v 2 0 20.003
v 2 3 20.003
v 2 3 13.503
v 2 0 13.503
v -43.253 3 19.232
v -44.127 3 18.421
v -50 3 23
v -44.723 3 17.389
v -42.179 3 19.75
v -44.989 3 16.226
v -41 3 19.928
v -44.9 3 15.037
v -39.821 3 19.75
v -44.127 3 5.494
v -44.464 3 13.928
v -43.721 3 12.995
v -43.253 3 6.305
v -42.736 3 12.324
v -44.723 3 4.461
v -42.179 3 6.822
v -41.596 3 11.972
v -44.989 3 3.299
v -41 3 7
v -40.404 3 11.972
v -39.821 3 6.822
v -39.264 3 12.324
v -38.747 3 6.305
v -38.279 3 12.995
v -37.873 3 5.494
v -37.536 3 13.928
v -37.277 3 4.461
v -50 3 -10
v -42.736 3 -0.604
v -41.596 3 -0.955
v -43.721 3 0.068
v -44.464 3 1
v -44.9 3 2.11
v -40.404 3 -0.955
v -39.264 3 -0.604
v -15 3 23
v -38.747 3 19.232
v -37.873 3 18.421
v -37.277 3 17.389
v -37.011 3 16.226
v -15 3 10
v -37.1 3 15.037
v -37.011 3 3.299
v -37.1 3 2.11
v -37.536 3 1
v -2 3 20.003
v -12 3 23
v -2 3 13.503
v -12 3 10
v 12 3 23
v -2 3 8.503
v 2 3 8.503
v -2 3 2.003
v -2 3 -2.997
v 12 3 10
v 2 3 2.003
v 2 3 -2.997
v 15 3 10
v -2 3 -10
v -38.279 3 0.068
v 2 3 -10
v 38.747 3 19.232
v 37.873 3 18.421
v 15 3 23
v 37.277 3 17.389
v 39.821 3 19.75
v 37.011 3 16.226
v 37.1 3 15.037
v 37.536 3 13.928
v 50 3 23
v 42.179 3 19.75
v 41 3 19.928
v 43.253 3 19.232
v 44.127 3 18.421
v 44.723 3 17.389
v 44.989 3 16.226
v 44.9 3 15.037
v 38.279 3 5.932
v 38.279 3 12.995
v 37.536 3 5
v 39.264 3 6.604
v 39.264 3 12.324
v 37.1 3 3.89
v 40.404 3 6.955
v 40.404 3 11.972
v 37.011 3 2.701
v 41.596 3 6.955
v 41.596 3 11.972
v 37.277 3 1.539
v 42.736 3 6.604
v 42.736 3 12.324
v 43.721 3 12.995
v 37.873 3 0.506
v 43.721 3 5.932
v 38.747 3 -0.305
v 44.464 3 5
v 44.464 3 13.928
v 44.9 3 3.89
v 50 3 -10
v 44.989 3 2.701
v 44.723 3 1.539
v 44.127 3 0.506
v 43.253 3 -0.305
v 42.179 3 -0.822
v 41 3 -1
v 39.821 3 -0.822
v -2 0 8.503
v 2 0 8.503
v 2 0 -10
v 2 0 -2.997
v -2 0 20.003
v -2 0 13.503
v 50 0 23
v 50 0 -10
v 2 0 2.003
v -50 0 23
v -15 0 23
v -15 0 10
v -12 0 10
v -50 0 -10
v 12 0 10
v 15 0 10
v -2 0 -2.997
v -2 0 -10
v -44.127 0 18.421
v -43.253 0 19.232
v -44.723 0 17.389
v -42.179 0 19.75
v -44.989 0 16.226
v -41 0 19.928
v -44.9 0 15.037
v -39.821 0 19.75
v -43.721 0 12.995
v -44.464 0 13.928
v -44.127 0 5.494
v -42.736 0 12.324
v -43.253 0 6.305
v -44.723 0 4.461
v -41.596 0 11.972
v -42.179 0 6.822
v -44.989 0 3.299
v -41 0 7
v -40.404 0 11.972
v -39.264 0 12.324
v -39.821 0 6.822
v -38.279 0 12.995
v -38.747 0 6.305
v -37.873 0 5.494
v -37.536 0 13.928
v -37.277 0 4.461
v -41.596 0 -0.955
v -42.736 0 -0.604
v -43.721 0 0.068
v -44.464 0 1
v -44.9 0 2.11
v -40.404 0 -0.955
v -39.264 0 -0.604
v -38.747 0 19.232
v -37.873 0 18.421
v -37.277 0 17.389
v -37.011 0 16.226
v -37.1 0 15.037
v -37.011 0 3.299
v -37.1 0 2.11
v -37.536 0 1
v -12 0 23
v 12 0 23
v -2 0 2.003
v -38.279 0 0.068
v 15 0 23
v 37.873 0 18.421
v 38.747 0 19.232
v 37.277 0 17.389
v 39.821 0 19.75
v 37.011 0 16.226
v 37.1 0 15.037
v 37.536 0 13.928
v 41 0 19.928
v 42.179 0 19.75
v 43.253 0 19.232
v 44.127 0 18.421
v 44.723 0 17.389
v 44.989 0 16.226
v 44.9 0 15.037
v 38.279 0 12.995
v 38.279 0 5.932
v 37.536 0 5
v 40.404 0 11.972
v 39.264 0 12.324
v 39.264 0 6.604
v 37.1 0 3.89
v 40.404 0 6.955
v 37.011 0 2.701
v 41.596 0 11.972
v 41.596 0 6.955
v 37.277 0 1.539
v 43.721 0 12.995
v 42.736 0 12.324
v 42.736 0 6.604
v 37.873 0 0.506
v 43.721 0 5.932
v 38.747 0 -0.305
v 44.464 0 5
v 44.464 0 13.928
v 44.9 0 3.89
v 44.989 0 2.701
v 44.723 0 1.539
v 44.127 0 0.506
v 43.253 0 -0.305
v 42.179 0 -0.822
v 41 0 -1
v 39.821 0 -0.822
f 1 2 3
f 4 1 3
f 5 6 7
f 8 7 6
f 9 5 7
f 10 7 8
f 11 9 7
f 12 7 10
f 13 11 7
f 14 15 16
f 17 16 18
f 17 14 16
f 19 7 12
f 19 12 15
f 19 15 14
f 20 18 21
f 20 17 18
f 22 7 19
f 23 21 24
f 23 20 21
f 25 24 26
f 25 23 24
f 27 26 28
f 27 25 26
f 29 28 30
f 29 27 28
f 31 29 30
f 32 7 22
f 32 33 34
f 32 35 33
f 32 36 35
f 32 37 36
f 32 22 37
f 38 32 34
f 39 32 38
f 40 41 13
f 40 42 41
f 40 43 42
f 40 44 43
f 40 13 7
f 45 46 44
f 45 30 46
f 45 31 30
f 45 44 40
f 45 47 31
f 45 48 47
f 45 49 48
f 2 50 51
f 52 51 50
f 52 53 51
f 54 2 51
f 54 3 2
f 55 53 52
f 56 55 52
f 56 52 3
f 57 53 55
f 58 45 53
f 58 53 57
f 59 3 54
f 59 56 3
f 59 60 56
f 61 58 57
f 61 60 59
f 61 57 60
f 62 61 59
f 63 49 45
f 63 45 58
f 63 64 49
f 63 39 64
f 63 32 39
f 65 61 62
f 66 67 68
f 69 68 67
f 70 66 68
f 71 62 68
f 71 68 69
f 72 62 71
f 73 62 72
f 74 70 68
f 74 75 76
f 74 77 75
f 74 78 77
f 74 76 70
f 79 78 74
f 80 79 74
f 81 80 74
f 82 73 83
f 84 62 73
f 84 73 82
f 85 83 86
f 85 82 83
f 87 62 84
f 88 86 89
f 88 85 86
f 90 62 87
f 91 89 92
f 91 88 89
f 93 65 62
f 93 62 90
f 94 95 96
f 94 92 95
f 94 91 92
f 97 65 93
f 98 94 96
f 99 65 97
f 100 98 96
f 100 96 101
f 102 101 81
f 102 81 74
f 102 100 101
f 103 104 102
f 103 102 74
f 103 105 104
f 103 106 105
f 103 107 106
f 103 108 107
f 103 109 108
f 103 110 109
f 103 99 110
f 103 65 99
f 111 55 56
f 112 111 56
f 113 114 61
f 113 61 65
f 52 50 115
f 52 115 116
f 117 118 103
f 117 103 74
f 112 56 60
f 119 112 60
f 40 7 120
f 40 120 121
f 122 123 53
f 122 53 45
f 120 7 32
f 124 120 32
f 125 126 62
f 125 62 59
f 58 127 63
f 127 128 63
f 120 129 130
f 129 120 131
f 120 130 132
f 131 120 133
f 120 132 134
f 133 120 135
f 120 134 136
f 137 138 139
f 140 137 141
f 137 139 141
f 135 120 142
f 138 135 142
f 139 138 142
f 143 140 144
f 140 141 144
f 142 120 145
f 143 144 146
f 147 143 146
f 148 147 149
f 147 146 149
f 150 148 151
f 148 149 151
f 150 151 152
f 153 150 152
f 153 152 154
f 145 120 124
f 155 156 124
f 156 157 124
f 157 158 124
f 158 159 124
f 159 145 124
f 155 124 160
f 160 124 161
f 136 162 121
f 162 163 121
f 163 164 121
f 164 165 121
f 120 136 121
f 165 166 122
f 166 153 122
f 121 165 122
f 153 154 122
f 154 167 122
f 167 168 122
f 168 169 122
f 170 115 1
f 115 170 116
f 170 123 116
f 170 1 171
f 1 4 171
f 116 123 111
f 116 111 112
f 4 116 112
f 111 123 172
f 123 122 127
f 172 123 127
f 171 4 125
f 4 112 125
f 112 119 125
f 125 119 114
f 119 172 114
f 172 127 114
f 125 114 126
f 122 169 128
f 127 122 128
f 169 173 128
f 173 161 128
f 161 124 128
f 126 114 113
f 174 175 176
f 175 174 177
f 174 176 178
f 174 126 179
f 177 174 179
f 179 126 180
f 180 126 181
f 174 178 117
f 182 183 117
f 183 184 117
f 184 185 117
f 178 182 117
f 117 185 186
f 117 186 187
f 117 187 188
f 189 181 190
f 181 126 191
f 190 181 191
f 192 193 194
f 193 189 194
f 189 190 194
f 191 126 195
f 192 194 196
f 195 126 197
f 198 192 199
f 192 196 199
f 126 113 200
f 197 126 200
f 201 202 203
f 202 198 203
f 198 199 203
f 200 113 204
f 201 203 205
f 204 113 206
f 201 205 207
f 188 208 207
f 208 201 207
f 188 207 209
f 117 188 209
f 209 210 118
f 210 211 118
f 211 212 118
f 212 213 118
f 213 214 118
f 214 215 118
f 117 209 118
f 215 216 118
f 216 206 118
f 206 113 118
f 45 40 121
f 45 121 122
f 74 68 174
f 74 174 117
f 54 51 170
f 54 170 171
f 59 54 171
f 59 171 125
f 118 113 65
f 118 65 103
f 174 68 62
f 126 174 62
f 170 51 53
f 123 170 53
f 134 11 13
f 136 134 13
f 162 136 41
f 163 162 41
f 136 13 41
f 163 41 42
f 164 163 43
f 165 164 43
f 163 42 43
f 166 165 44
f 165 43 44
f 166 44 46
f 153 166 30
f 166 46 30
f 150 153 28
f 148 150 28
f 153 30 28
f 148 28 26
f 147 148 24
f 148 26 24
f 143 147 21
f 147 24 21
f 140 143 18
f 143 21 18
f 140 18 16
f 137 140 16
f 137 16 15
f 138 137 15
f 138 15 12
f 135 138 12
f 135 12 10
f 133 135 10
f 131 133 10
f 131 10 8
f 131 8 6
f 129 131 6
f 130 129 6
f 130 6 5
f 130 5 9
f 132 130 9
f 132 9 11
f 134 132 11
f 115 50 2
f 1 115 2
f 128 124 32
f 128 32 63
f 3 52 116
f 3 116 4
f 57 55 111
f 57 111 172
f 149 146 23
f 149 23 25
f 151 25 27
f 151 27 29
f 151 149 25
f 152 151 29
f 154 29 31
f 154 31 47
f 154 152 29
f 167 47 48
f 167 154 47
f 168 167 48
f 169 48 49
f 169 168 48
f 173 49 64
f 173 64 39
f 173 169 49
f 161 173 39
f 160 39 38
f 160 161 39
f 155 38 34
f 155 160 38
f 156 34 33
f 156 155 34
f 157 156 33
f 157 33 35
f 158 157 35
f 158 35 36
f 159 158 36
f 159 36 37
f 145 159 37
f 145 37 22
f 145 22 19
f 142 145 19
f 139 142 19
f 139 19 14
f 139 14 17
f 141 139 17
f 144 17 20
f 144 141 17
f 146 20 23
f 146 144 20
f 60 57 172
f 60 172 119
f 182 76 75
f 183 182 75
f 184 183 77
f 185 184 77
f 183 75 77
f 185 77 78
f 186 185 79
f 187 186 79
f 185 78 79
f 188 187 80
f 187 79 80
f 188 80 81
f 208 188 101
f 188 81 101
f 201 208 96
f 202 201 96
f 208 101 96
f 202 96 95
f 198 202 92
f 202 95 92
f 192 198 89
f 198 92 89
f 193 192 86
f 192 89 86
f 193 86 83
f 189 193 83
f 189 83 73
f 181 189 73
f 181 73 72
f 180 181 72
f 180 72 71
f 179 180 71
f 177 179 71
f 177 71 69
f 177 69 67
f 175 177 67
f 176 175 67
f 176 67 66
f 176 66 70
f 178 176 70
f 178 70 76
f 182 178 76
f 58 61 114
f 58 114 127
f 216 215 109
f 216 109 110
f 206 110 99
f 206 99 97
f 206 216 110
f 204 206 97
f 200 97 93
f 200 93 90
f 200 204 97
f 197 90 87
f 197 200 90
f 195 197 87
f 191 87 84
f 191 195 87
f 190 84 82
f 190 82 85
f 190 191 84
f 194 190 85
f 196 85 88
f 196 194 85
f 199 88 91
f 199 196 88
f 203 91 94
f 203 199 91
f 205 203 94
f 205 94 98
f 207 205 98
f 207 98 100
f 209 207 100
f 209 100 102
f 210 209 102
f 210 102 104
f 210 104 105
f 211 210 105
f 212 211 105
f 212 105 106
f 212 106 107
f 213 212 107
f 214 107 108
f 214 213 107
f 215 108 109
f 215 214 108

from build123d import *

# Parameters (mm, degrees)
SKETCH_1_R          = 4
EXTRUDE_1_DEPTH     = 3
SKETCH_2_W          = 4
SKETCH_2_H          = 3
CUT_EXTRUDE_1_DEPTH = 3.33
SKETCH_3_W          = 24
SKETCH_3_H          = 13
EXTRUDE_2_DEPTH     = 3
SKETCH_4_W          = 35
SKETCH_4_H          = 13
EXTRUDE_3_DEPTH     = 3
SKETCH_5_R          = 4
CUT_EXTRUDE_2_DEPTH = 25
SKETCH_6_W          = 4
SKETCH_6_H          = 6.5
CUT_EXTRUDE_3_DEPTH = 25


with BuildPart() as part:
    # Эскиз1 → Бобышка-Вытянуть1 (new body)
    with BuildSketch(Plane(origin=(0, 0, 0), x_dir=(1, 0, 0), z_dir=(0, 1, 0))):
        Polygon((2, 10), (50, 10), (50, -10), (-50, -10), (-50, 10), (-2, 10), (-2, 6.32739691), (2, 6.32739691), align=None)
        with Locations(Location((-41, -3, 0), (0, 0, 270))):
            Circle(SKETCH_1_R, mode=Mode.SUBTRACT)
        with Locations(Location((41, -3, 0), (0, 0, 90))):
            Circle(SKETCH_1_R, mode=Mode.SUBTRACT)
    extrude(amount=EXTRUDE_1_DEPTH)

    # Эскиз2 → Вырез-Вытянуть1 (cut)
    with BuildSketch(Plane(origin=(0, 0, -6.32739691), x_dir=(-1, 0, 0), z_dir=(0, 0, -1))):
        with Locations((0, 1.5)):
            Rectangle(SKETCH_2_W, SKETCH_2_H)
    extrude(amount=-CUT_EXTRUDE_1_DEPTH, mode=Mode.SUBTRACT)

    # Эскиз3 → Бобышка-Вытянуть2 (add)
    with BuildSketch(Plane(origin=(0, 3, 0), x_dir=(1, 0, 0), z_dir=(0, 1, 0))):
        with Locations((0, -16.5)):
            Rectangle(SKETCH_3_W, SKETCH_3_H)
    extrude(amount=-EXTRUDE_2_DEPTH)

    # Эскиз4 → Бобышка-Вытянуть3 (add)
    with BuildSketch(Plane(origin=(0, 3, 0), x_dir=(1, 0, 0), z_dir=(0, 1, 0))):
        with Locations((-32.5, -16.5)):
            Rectangle(SKETCH_4_W, SKETCH_4_H)
        with Locations((32.5, -16.5)):
            Rectangle(SKETCH_4_W, SKETCH_4_H)
    extrude(amount=-EXTRUDE_3_DEPTH)

    # Эскиз5 → Вырез-Вытянуть2 (cut)
    with BuildSketch(Plane(origin=(0, 3, 0), x_dir=(1, 0, 0), z_dir=(0, 1, 0))):
        with Locations(Location((-41, -15.92753052, 0), (0, 0, 270))):
            Circle(SKETCH_5_R)
        with Locations(Location((41, -15.92753052, 0), (0, 0, 270))):
            Circle(SKETCH_5_R)
    extrude(amount=-CUT_EXTRUDE_2_DEPTH, mode=Mode.SUBTRACT)

    # Эскиз6 → Вырез-Вытянуть3 (cut)
    with BuildSketch(Plane(origin=(0, 3, 0), x_dir=(1, 0, 0), z_dir=(0, 1, 0))):
        with Locations((0, -5.25260309)):
            Rectangle(SKETCH_6_W, SKETCH_6_H)
        with Locations((0, -16.75260309)):
            Rectangle(SKETCH_6_W, SKETCH_6_H)
    extrude(amount=-CUT_EXTRUDE_3_DEPTH, mode=Mode.SUBTRACT)


solid = part.part
